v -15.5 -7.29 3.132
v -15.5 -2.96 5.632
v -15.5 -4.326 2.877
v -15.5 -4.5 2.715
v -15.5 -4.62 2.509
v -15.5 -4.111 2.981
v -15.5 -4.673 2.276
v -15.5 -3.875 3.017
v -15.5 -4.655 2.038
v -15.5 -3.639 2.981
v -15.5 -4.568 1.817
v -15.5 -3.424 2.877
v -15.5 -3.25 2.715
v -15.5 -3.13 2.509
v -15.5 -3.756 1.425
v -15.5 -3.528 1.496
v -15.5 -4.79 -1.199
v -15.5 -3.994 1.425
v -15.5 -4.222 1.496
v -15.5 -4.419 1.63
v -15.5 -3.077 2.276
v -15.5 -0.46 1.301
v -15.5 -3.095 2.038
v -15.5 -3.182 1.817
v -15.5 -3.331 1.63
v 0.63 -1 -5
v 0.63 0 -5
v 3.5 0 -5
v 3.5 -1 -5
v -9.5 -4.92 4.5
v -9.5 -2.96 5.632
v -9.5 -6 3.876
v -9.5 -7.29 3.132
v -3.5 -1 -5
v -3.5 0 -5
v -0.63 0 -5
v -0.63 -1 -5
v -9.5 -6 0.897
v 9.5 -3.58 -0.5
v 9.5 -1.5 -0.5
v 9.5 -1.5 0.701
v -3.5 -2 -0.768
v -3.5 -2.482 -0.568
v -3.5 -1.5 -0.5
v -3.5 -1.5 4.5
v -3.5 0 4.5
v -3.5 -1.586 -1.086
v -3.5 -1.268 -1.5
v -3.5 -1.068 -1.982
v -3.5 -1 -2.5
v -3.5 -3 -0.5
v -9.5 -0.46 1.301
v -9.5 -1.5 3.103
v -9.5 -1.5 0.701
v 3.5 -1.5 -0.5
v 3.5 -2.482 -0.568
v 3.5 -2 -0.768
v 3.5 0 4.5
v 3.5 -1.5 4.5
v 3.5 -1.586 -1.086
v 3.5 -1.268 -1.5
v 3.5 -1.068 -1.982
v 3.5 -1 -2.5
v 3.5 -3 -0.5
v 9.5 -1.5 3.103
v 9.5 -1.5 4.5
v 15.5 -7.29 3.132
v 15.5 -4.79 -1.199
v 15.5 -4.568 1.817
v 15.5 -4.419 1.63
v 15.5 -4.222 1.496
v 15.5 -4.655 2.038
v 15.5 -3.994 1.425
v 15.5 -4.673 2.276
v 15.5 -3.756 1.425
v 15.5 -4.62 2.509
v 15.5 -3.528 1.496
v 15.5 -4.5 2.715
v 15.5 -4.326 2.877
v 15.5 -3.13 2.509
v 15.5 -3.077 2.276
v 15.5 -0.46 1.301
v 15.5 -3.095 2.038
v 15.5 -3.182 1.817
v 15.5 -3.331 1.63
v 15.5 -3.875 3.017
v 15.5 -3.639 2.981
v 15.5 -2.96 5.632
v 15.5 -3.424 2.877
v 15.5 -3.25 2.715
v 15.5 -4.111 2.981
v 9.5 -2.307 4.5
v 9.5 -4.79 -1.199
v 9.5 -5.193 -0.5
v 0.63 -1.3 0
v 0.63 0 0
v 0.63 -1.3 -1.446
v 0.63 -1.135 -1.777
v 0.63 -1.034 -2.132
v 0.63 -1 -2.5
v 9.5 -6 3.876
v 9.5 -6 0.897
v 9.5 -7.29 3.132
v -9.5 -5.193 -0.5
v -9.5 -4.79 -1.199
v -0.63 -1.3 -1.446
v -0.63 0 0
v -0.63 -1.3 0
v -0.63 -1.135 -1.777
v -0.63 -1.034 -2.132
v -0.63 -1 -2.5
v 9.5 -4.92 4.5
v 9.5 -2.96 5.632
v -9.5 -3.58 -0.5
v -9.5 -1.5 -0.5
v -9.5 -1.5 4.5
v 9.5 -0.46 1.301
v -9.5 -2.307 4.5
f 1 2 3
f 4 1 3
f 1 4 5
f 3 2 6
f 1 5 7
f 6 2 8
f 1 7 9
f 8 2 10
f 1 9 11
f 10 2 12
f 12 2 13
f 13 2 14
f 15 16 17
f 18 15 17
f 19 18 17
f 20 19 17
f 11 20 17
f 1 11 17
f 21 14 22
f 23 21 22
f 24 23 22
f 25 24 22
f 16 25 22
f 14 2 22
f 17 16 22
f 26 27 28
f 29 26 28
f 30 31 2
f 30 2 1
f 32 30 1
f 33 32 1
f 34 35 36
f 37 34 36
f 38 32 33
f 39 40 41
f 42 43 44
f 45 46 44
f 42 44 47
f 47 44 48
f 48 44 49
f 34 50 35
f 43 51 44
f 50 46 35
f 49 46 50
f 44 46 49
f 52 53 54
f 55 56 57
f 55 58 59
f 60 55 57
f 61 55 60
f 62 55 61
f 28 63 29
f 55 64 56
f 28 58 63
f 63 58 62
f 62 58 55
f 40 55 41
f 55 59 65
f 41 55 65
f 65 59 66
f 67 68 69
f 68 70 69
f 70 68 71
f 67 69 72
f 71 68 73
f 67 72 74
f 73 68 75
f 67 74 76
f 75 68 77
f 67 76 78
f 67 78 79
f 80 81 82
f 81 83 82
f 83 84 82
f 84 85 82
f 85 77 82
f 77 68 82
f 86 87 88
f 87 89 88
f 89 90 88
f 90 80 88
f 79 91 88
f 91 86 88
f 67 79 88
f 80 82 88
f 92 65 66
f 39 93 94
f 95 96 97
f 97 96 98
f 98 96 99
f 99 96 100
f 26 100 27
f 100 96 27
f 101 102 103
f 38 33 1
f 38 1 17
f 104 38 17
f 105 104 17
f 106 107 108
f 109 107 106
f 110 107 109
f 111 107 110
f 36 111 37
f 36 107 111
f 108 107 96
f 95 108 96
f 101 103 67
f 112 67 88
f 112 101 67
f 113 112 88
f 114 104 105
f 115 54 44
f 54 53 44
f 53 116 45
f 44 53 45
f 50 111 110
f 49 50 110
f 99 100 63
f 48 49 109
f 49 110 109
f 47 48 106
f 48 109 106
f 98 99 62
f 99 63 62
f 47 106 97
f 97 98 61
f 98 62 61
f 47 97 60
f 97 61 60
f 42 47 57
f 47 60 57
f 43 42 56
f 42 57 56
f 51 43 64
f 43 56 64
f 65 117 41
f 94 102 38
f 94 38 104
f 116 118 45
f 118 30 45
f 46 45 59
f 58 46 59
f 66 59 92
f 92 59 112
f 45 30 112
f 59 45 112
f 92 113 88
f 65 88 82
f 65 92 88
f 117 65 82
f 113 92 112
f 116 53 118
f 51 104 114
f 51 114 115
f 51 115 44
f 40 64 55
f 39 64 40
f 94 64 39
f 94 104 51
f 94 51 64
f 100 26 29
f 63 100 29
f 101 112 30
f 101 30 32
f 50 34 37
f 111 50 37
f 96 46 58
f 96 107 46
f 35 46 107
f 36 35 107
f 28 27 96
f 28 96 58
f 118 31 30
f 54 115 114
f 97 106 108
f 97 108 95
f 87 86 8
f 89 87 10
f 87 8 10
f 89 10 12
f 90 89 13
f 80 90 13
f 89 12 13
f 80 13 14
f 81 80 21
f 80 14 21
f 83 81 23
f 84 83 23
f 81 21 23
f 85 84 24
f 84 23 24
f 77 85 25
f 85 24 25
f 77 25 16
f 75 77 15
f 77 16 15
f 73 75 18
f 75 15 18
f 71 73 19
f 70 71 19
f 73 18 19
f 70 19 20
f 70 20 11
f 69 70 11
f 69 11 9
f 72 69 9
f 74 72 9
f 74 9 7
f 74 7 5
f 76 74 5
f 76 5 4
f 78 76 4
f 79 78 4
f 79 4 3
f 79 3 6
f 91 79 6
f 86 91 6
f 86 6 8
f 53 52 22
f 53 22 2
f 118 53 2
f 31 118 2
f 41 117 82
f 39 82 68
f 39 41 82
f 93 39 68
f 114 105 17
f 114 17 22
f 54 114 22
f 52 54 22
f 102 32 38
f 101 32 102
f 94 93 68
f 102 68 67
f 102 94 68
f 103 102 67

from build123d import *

# Parameters (mm, degrees)
SKETCH_1_W          = 7
SKETCH_1_H          = 4.5
EXTRUDE_1_DEPTH     = 1
SKETCH_1_3_W        = 7
SKETCH_1_3_H        = 5
EXTRUDE_2_DEPTH     = 4
FILLET2_R           = 2
SKETCH_2_W          = 19
SKETCH_2_H          = 5
EXTRUDE_3_DEPTH     = 2
SKETCH_2_4_W        = 19
SKETCH_2_4_H        = 5
EXTRUDE_4_DEPTH     = 2.5
SKETCH_11_W         = 1.26
SKETCH_11_H         = 5
CUT_EXTRUDE_4_DEPTH = 1.3
BOSS_EXTRUDE1_DEPTH = 6
BOSS_EXTRUDE2_DEPTH = 6
SKETCH5_R           = 0.8
CUT_EXTRUDE3_DEPTH  = 33.339752706
CUT_EXTRUDE8_DEPTH  = 27.643190595


with BuildPart() as part:
    # 草图1 → 凸台-拉伸1 (new body)
    with BuildSketch(Plane(origin=(0, 0, 0), x_dir=(1, 0, 0), z_dir=(0, 1, 0))):
        with Locations((0, 2.75)):
            Rectangle(SKETCH_1_W, SKETCH_1_H)
    extrude(amount=-EXTRUDE_1_DEPTH)

    # 草图1<3> → 凸台-拉伸2 (add)
    with BuildSketch(Plane(origin=(0, 0, 0), x_dir=(1, 0, 0), z_dir=(0, 1, 0))):
        with Locations((0, -2)):
            Rectangle(SKETCH_1_3_W, SKETCH_1_3_H)
    extrude(amount=-EXTRUDE_2_DEPTH)

    # Fillet2
    fillet2_edges = [part.edges().sort_by_distance(p)[0] for p in [
        (0, -1, -0.5),
    ]]
    fillet(fillet2_edges, radius=FILLET2_R)

    # 草图2 → 凸台-拉伸3 (add)
    with BuildSketch(Plane.XZ.offset(4)):
        with Locations((0, 2)):
            Rectangle(SKETCH_2_W, SKETCH_2_H)
    extrude(amount=EXTRUDE_3_DEPTH)

    # 草图2<4> → 凸台-拉伸4 (add)
    with BuildSketch(Plane.XZ.offset(4)):
        with Locations((0, 2)):
            Rectangle(SKETCH_2_4_W, SKETCH_2_4_H)
    extrude(amount=-EXTRUDE_4_DEPTH)

    # 草图11 → 切除-拉伸4 (cut)
    with BuildSketch(Plane(origin=(0, 0, 0), x_dir=(1, 0, 0), z_dir=(0, 1, 0))):
        with Locations((0, 2.5)):
            Rectangle(SKETCH_11_W, SKETCH_11_H)
    extrude(amount=-CUT_EXTRUDE_4_DEPTH, mode=Mode.SUBTRACT)

    # Sketch1 → Boss-Extrude1 (add)
    with BuildSketch(Plane.ZY.offset(9.5)):
        Polygon((-1.198557159, -4.790063509), (1.301442841, -0.459936491), (5.63156986, -2.959936491), (3.13156986, -7.290063509), align=None)
    extrude(amount=BOSS_EXTRUDE1_DEPTH)

    # Sketch2 → Boss-Extrude2 (add)
    with BuildSketch(Plane(origin=(9.5, 0, 0), x_dir=(0, 0, -1), z_dir=(1, 0, 0))):
        Polygon((-5.63156986, -2.959936491), (-1.301442841, -0.459936491), (1.198557159, -4.790063509), (-3.13156986, -7.290063509), align=None)
    extrude(amount=BOSS_EXTRUDE2_DEPTH)

    # Sketch5 → Cut-Extrude3 (cut, through all)
    with BuildSketch(Plane.ZY.offset(15.5)):
        with Locations((2.216506351, -3.875)):
            Circle(SKETCH5_R)
    extrude(amount=-CUT_EXTRUDE3_DEPTH, mode=Mode.SUBTRACT)

    # Sketch8 → Cut-Extrude8 (cut, through all)
    with BuildSketch(Plane.ZY.offset(9.5)):
        Polygon((-0.5, -5.193375673), (-0.5, -6), (0.897114317, -6), align=None)
        Polygon((4.5, -4.919872981), (3.876388375, -6), (4.5, -6), align=None)
    extrude(amount=-CUT_EXTRUDE8_DEPTH, mode=Mode.SUBTRACT)


solid = part.part
